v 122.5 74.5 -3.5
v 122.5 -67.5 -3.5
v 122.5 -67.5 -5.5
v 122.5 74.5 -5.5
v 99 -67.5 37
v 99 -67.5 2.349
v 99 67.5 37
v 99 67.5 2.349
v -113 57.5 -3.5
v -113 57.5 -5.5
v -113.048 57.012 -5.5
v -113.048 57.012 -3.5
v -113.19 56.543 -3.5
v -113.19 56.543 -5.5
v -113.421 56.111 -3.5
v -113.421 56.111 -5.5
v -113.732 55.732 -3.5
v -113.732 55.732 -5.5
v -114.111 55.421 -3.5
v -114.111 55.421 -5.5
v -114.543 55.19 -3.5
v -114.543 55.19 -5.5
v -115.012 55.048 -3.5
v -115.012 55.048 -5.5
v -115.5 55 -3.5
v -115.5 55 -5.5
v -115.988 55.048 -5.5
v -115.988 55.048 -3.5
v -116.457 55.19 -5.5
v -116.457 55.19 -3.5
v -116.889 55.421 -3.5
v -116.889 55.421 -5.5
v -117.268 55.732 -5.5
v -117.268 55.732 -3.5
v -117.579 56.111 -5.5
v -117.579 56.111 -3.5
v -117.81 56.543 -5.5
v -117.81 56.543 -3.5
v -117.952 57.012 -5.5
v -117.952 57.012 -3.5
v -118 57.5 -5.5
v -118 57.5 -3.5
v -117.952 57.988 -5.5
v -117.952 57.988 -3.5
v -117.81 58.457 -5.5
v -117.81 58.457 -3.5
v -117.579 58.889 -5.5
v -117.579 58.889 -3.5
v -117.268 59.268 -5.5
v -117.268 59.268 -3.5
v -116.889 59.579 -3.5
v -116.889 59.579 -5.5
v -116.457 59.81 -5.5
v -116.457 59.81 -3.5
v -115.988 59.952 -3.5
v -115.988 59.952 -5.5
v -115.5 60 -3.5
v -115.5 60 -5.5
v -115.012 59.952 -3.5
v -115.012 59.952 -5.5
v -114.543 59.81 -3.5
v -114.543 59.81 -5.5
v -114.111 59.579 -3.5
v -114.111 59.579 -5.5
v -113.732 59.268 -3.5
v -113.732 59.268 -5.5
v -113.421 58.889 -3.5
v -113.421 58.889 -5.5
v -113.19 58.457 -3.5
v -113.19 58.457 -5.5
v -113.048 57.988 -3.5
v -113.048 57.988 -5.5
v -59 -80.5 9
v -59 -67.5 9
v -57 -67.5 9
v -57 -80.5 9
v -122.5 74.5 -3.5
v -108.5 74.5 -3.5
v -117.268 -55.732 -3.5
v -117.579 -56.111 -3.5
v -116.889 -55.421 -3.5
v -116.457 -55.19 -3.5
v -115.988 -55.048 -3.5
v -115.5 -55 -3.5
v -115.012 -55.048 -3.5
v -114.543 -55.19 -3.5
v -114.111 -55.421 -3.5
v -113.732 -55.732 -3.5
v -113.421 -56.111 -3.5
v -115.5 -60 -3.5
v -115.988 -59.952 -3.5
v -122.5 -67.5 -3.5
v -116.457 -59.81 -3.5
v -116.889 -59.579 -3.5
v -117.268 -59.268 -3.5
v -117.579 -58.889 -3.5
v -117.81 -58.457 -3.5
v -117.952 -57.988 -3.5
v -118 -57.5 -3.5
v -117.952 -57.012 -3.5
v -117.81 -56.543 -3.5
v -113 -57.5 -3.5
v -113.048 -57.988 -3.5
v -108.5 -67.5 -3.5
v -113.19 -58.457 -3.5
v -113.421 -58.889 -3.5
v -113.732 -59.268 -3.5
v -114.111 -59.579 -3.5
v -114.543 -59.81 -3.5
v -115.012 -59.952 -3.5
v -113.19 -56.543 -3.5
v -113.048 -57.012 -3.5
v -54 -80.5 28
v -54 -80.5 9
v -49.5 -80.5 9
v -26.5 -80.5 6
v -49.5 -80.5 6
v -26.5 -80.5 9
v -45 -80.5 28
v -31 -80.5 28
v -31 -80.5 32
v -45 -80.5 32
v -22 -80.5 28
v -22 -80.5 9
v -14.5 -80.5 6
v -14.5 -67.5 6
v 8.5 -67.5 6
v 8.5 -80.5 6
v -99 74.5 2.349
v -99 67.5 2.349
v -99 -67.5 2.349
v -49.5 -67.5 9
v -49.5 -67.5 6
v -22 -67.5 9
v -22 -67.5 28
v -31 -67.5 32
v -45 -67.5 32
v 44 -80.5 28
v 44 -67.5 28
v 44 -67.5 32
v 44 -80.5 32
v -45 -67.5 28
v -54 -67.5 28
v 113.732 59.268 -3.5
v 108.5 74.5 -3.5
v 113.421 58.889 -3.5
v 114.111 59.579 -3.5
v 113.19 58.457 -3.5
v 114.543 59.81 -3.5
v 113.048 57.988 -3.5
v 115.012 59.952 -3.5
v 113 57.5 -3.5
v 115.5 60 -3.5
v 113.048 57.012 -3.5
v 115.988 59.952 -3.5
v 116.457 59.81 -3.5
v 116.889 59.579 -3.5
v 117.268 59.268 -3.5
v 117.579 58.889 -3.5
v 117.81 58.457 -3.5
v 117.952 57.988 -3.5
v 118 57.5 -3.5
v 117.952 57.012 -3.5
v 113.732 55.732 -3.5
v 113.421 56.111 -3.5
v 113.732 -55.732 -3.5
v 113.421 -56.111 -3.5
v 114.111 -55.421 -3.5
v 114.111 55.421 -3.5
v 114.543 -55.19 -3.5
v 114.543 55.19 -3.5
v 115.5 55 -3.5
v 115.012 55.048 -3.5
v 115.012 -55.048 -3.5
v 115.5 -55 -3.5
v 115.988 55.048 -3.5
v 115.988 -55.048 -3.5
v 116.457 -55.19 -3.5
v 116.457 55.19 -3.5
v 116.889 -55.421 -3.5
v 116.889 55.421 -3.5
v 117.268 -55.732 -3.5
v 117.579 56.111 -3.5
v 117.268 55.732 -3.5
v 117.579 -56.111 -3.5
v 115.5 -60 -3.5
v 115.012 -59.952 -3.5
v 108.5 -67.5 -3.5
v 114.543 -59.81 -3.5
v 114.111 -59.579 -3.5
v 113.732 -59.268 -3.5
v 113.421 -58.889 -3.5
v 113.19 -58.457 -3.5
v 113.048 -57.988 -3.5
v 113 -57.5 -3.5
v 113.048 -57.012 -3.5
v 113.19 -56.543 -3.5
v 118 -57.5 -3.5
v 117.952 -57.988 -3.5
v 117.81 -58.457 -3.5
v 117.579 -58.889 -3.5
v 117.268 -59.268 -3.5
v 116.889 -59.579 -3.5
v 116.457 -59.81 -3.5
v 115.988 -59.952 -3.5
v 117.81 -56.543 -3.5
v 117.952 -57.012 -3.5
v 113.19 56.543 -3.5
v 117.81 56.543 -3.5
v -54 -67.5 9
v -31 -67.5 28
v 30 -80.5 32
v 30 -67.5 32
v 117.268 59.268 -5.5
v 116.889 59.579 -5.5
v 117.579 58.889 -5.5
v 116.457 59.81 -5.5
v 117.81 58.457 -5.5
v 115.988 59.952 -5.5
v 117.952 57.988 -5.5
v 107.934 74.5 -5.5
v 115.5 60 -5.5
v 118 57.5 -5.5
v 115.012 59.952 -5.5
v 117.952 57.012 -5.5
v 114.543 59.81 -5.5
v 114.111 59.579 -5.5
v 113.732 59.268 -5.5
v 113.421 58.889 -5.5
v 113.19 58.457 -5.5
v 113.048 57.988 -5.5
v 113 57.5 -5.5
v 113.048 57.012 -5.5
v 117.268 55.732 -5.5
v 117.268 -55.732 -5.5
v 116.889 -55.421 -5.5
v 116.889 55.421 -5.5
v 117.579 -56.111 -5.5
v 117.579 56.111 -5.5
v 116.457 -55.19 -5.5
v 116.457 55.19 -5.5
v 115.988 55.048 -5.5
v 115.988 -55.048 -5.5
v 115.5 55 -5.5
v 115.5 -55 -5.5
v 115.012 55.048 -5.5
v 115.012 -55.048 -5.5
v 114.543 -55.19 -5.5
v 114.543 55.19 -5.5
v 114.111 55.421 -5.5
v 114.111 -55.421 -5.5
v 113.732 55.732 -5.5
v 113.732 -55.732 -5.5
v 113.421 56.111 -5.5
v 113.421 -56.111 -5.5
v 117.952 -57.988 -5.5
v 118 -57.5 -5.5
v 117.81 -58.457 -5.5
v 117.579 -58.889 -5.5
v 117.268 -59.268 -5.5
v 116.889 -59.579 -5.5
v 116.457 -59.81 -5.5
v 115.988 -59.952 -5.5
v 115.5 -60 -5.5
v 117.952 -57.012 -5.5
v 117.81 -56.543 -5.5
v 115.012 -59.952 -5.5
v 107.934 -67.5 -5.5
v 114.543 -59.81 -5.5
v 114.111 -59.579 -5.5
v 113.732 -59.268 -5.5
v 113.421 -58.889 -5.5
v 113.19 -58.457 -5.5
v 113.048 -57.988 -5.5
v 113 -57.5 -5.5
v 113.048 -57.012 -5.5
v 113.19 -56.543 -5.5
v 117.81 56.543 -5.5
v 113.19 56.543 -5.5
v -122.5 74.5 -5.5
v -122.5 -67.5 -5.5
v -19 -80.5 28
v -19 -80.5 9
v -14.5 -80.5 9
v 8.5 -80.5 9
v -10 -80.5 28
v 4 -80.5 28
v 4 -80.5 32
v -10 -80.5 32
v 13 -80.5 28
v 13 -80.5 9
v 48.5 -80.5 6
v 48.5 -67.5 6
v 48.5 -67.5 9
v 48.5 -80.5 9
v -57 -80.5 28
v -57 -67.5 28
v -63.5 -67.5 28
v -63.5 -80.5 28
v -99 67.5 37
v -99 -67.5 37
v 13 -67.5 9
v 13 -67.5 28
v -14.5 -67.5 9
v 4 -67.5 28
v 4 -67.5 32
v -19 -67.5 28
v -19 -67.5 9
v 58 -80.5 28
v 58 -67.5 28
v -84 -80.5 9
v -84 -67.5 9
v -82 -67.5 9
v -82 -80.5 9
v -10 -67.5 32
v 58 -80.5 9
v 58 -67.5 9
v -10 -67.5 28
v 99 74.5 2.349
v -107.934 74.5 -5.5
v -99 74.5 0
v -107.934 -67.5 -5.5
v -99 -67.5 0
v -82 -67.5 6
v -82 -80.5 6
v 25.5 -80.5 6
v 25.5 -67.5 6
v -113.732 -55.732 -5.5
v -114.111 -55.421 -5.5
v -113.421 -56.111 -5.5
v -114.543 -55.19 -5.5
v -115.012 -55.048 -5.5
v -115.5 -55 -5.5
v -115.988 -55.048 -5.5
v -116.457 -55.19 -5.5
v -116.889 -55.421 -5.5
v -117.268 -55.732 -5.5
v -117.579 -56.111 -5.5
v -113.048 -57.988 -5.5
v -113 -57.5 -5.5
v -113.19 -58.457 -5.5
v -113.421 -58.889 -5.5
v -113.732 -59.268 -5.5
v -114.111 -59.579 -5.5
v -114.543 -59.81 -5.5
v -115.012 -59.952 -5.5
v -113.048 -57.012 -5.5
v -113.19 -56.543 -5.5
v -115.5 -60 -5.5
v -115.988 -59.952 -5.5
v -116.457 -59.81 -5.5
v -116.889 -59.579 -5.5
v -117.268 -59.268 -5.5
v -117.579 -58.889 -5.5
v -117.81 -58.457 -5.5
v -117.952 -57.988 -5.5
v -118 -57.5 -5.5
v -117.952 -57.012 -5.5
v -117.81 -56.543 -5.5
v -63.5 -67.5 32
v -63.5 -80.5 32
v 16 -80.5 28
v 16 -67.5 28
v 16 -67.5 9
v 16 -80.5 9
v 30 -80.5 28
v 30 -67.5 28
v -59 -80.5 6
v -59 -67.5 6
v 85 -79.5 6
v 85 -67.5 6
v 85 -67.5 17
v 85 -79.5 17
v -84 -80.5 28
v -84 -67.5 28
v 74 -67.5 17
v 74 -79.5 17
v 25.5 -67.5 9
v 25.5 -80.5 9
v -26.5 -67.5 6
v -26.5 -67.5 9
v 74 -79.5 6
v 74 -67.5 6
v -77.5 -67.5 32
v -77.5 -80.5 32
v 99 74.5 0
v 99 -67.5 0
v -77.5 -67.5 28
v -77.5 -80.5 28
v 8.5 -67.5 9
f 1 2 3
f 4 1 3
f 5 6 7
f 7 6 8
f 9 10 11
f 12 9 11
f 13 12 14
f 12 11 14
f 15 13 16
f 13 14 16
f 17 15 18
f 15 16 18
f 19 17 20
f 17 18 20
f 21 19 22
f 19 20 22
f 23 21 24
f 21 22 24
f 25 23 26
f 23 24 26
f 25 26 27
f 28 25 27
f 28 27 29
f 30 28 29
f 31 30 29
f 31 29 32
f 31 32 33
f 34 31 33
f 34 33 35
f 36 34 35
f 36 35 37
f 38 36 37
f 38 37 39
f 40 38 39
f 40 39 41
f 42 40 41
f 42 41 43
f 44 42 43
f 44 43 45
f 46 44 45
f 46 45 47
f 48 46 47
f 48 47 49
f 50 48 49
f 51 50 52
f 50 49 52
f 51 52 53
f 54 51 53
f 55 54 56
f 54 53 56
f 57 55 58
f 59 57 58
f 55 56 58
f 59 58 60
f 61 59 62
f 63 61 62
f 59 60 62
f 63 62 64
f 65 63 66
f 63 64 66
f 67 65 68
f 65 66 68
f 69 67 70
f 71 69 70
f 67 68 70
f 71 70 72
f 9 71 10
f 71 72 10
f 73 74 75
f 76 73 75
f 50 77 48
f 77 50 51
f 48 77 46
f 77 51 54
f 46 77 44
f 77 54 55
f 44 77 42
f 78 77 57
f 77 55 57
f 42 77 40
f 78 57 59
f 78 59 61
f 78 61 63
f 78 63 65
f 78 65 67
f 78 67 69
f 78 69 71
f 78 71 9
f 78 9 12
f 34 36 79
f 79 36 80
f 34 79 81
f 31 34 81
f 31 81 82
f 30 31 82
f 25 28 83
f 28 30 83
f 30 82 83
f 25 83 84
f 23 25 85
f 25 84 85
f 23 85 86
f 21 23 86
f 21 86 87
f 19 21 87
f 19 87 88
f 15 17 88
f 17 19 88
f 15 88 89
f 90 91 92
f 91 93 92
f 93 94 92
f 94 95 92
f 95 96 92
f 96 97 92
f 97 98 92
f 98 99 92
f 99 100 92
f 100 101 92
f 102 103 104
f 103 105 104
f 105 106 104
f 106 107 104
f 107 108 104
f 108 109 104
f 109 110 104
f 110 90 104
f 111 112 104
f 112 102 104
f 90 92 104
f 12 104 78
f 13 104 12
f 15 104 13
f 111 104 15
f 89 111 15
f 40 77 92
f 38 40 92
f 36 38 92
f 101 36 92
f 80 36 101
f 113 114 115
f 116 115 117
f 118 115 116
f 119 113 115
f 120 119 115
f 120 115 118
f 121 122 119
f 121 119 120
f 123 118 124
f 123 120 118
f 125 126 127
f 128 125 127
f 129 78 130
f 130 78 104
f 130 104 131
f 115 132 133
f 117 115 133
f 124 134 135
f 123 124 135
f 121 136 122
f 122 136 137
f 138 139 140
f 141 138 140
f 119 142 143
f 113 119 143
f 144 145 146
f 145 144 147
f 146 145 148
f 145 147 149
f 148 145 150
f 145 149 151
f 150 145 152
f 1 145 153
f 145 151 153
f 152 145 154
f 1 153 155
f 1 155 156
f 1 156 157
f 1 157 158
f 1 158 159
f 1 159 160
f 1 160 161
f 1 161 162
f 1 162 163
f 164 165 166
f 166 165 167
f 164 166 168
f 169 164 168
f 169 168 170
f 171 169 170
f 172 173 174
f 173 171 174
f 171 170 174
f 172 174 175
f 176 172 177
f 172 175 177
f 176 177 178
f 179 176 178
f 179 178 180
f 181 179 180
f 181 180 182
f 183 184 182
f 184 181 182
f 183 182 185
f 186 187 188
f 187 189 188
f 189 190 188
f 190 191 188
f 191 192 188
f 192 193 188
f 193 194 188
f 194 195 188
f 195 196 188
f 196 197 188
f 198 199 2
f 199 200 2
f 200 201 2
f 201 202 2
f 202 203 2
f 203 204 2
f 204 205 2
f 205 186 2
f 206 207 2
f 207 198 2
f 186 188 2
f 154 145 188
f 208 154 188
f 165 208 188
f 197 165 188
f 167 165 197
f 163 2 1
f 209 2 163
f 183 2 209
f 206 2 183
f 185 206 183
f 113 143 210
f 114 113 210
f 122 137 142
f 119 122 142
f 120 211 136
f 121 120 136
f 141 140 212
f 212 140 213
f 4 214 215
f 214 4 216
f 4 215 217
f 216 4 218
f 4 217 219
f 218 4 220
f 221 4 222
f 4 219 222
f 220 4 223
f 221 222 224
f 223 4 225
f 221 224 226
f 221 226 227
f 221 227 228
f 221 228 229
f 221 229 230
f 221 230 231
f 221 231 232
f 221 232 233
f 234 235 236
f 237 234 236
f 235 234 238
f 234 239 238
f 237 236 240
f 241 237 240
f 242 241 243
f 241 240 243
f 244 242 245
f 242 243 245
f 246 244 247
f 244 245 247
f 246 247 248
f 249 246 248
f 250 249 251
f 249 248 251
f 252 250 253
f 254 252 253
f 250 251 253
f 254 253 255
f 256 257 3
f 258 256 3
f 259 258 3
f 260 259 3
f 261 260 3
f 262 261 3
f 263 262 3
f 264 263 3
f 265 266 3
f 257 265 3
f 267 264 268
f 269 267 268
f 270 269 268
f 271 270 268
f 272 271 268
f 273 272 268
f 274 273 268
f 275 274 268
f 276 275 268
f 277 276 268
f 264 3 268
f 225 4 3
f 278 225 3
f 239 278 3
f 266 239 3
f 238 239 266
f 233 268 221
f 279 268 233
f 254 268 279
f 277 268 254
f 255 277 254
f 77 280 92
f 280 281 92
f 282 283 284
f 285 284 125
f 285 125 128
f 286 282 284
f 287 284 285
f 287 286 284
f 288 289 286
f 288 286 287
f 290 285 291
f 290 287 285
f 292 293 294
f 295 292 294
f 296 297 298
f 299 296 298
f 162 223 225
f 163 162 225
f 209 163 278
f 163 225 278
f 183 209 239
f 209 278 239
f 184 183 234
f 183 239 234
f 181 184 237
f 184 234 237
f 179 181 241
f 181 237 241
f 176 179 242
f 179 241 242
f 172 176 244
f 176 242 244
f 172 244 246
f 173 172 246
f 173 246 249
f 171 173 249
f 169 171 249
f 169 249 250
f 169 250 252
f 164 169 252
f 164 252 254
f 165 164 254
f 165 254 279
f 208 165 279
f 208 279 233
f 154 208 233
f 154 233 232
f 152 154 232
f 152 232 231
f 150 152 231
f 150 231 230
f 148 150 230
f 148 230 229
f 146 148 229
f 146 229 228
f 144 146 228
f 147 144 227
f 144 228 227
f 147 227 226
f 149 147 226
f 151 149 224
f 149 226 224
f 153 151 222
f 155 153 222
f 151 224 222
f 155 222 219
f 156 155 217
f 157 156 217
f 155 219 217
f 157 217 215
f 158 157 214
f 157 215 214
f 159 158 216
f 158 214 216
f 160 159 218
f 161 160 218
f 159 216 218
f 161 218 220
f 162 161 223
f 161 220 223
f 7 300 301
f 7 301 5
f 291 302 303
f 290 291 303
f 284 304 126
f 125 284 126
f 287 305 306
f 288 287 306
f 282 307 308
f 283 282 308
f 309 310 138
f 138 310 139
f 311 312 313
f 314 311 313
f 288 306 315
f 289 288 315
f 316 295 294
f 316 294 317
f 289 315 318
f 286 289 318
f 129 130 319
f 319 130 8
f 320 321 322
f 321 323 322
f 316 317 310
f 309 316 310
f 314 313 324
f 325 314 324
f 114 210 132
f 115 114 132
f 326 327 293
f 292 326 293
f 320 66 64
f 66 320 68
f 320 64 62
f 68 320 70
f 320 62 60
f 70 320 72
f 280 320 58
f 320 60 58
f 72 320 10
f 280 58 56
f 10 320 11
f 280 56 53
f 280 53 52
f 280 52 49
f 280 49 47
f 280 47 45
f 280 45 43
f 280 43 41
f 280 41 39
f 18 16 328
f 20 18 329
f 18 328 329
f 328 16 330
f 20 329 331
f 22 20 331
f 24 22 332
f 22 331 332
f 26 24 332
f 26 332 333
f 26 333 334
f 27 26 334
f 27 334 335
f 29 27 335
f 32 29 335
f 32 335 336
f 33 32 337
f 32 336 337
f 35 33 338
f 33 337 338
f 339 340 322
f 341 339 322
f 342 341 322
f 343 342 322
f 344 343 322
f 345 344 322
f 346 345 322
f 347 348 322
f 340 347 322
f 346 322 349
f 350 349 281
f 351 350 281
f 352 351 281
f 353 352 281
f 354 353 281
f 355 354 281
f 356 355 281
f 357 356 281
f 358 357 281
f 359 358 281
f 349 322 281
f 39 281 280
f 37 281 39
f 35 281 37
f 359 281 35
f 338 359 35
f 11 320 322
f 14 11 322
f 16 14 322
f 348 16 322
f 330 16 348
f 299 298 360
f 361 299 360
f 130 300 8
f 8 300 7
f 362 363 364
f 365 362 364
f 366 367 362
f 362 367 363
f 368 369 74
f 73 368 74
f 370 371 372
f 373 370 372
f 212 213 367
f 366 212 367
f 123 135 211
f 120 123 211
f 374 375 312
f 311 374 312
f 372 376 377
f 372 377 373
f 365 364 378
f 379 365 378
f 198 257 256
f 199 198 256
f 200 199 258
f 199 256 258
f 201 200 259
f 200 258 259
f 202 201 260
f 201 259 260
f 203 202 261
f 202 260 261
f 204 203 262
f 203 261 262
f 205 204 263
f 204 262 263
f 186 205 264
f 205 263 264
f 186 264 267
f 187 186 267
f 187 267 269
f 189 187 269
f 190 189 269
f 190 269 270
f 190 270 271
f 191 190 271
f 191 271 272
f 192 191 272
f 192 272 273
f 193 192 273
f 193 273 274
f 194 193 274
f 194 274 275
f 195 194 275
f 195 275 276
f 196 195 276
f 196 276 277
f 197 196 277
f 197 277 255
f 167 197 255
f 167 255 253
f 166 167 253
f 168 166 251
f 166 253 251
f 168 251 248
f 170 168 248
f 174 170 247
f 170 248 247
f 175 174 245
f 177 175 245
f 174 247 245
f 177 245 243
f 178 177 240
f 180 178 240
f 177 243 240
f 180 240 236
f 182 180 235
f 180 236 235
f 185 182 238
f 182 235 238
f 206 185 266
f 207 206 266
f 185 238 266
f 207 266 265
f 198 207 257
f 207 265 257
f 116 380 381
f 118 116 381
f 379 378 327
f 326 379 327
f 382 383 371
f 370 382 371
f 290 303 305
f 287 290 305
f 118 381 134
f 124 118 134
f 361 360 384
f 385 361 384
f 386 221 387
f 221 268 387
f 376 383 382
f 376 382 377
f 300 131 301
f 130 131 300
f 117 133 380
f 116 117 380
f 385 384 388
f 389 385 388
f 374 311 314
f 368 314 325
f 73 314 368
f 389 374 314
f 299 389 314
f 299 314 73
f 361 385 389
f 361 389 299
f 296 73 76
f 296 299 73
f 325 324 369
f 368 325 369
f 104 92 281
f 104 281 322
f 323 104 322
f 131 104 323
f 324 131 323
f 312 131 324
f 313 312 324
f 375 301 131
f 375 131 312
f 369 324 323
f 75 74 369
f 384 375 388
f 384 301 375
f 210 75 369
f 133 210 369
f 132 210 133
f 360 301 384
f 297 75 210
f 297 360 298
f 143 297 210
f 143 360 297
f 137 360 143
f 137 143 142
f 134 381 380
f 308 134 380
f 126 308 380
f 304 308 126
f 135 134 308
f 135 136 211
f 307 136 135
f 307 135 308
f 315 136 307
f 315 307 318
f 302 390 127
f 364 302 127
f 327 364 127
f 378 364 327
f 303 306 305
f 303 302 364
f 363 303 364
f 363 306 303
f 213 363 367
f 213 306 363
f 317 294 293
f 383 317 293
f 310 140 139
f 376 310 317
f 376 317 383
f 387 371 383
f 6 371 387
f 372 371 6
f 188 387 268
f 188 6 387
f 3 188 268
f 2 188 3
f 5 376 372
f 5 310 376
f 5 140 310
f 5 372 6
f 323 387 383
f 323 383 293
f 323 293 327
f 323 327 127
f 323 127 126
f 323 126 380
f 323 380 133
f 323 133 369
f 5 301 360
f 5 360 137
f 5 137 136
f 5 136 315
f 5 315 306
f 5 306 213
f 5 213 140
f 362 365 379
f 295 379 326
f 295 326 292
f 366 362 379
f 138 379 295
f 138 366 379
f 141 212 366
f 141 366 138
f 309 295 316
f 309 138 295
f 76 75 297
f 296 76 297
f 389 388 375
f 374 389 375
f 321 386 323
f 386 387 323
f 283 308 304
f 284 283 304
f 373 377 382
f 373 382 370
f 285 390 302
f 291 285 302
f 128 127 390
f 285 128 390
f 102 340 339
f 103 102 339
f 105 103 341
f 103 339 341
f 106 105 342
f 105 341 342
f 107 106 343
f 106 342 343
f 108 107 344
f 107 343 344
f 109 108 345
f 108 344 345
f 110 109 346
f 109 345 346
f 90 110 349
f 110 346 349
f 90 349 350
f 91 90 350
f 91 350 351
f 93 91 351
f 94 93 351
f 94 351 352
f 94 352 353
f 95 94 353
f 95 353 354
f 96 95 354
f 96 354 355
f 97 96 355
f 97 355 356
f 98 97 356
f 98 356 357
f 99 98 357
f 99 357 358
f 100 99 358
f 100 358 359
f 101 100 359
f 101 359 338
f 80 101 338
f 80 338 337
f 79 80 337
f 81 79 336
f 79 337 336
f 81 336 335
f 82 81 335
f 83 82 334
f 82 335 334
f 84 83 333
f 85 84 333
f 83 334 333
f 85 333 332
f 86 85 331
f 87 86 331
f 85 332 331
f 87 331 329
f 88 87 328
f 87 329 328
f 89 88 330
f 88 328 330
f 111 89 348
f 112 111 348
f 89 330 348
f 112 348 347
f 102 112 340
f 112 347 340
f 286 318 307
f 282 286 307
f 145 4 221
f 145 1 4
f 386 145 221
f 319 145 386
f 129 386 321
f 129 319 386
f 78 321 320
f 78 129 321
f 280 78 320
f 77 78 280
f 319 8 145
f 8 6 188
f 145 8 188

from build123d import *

# Parameters (mm, degrees)
F0_W      = 198
F0_H      = 135
F1_DEPTH  = 37
F3_DEPTH  = 135
F4_R      = 2.5
F5_DEPTH  = 25
F7_DEPTH  = 7
F9_DEPTH  = 13
F10_W     = 11
F10_H     = 11
F11_DEPTH = 12


with BuildPart() as f1:
    # F0 (on Top) → F1 (new body)
    with BuildSketch(Plane.XY):
        Rectangle(F0_W, F0_H)
    extrude(amount=F1_DEPTH)

    # F2 (on face) → F3 (join, through all)
    with BuildSketch(Plane.XZ.offset(67.5)):
        Polygon((-108.5, -3.5), (-122.5, -3.5), (-122.5, -5.5), (-107.933711, -5.5), (-99, 0), (-99, 2.348633), align=None)
        Polygon((99, 2.348633), (99, 0), (107.933711, -5.5), (122.5, -5.5), (122.5, -3.5), (108.5, -3.5), align=None)
    extrude(amount=-F3_DEPTH)

    # F4 (on face) → F5 (cut)
    with BuildSketch(Plane(origin=(0, 0, -5.5), x_dir=(1, 0, 0), z_dir=(0, 0, -1))):
        with Locations((-115.5, 57.5)):
            Circle(F4_R)
        with Locations((-115.5, -57.5)):
            Circle(F4_R)
        with Locations((115.5, -57.5)):
            Circle(F4_R)
        with Locations((115.5, 57.5)):
            Circle(F4_R)
    extrude(amount=-F5_DEPTH, mode=Mode.SUBTRACT)

    # F6 (on face) → F7 (join)
    with BuildSketch(Plane(origin=(0, 67.5, 0), x_dir=(-1, 0, 0), z_dir=(0, 1, 0))):
        Polygon((-122.5, -5.5), (-107.933711, -5.5), (-99, 0), (99, 0), (107.933711, -5.5), (122.5, -5.5), (122.5, -3.5), (108.5, -3.5), (99, 2.348633), (-99, 2.348633), (-108.5, -3.5), (-122.5, -3.5), align=None)
    extrude(amount=F7_DEPTH)

    # F8 (on face) → F9 (join)
    with BuildSketch(Plane.XZ.offset(67.5)):
        Polygon((-77.5, 28), (-84, 28), (-84, 9), (-82, 9), (-82, 6), (-59, 6), (-59, 9), (-57, 9), (-57, 28), (-63.5, 28), (-63.5, 32), (-77.5, 32), align=None)
        Polygon((-45, 28), (-54, 28), (-54, 9), (-49.5, 9), (-49.5, 6), (-26.5, 6), (-26.5, 9), (-22, 9), (-22, 28), (-31, 28), (-31, 32), (-45, 32), align=None)
        Polygon((-10, 28), (-19, 28), (-19, 9), (-14.5, 9), (-14.5, 6), (8.5, 6), (8.5, 9), (13, 9), (13, 28), (4, 28), (4, 32), (-10, 32), align=None)
        Polygon((30, 28), (16, 28), (16, 9), (25.5, 9), (25.5, 6), (48.5, 6), (48.5, 9), (58, 9), (58, 28), (44, 28), (44, 32), (30, 32), align=None)
    extrude(amount=F9_DEPTH)

    # F10 (on face) → F11 (join)
    with BuildSketch(Plane.XZ.offset(67.5)):
        with Locations((79.5, 11.5)):
            Rectangle(F10_W, F10_H)
    extrude(amount=F11_DEPTH)


solid = f1.part
